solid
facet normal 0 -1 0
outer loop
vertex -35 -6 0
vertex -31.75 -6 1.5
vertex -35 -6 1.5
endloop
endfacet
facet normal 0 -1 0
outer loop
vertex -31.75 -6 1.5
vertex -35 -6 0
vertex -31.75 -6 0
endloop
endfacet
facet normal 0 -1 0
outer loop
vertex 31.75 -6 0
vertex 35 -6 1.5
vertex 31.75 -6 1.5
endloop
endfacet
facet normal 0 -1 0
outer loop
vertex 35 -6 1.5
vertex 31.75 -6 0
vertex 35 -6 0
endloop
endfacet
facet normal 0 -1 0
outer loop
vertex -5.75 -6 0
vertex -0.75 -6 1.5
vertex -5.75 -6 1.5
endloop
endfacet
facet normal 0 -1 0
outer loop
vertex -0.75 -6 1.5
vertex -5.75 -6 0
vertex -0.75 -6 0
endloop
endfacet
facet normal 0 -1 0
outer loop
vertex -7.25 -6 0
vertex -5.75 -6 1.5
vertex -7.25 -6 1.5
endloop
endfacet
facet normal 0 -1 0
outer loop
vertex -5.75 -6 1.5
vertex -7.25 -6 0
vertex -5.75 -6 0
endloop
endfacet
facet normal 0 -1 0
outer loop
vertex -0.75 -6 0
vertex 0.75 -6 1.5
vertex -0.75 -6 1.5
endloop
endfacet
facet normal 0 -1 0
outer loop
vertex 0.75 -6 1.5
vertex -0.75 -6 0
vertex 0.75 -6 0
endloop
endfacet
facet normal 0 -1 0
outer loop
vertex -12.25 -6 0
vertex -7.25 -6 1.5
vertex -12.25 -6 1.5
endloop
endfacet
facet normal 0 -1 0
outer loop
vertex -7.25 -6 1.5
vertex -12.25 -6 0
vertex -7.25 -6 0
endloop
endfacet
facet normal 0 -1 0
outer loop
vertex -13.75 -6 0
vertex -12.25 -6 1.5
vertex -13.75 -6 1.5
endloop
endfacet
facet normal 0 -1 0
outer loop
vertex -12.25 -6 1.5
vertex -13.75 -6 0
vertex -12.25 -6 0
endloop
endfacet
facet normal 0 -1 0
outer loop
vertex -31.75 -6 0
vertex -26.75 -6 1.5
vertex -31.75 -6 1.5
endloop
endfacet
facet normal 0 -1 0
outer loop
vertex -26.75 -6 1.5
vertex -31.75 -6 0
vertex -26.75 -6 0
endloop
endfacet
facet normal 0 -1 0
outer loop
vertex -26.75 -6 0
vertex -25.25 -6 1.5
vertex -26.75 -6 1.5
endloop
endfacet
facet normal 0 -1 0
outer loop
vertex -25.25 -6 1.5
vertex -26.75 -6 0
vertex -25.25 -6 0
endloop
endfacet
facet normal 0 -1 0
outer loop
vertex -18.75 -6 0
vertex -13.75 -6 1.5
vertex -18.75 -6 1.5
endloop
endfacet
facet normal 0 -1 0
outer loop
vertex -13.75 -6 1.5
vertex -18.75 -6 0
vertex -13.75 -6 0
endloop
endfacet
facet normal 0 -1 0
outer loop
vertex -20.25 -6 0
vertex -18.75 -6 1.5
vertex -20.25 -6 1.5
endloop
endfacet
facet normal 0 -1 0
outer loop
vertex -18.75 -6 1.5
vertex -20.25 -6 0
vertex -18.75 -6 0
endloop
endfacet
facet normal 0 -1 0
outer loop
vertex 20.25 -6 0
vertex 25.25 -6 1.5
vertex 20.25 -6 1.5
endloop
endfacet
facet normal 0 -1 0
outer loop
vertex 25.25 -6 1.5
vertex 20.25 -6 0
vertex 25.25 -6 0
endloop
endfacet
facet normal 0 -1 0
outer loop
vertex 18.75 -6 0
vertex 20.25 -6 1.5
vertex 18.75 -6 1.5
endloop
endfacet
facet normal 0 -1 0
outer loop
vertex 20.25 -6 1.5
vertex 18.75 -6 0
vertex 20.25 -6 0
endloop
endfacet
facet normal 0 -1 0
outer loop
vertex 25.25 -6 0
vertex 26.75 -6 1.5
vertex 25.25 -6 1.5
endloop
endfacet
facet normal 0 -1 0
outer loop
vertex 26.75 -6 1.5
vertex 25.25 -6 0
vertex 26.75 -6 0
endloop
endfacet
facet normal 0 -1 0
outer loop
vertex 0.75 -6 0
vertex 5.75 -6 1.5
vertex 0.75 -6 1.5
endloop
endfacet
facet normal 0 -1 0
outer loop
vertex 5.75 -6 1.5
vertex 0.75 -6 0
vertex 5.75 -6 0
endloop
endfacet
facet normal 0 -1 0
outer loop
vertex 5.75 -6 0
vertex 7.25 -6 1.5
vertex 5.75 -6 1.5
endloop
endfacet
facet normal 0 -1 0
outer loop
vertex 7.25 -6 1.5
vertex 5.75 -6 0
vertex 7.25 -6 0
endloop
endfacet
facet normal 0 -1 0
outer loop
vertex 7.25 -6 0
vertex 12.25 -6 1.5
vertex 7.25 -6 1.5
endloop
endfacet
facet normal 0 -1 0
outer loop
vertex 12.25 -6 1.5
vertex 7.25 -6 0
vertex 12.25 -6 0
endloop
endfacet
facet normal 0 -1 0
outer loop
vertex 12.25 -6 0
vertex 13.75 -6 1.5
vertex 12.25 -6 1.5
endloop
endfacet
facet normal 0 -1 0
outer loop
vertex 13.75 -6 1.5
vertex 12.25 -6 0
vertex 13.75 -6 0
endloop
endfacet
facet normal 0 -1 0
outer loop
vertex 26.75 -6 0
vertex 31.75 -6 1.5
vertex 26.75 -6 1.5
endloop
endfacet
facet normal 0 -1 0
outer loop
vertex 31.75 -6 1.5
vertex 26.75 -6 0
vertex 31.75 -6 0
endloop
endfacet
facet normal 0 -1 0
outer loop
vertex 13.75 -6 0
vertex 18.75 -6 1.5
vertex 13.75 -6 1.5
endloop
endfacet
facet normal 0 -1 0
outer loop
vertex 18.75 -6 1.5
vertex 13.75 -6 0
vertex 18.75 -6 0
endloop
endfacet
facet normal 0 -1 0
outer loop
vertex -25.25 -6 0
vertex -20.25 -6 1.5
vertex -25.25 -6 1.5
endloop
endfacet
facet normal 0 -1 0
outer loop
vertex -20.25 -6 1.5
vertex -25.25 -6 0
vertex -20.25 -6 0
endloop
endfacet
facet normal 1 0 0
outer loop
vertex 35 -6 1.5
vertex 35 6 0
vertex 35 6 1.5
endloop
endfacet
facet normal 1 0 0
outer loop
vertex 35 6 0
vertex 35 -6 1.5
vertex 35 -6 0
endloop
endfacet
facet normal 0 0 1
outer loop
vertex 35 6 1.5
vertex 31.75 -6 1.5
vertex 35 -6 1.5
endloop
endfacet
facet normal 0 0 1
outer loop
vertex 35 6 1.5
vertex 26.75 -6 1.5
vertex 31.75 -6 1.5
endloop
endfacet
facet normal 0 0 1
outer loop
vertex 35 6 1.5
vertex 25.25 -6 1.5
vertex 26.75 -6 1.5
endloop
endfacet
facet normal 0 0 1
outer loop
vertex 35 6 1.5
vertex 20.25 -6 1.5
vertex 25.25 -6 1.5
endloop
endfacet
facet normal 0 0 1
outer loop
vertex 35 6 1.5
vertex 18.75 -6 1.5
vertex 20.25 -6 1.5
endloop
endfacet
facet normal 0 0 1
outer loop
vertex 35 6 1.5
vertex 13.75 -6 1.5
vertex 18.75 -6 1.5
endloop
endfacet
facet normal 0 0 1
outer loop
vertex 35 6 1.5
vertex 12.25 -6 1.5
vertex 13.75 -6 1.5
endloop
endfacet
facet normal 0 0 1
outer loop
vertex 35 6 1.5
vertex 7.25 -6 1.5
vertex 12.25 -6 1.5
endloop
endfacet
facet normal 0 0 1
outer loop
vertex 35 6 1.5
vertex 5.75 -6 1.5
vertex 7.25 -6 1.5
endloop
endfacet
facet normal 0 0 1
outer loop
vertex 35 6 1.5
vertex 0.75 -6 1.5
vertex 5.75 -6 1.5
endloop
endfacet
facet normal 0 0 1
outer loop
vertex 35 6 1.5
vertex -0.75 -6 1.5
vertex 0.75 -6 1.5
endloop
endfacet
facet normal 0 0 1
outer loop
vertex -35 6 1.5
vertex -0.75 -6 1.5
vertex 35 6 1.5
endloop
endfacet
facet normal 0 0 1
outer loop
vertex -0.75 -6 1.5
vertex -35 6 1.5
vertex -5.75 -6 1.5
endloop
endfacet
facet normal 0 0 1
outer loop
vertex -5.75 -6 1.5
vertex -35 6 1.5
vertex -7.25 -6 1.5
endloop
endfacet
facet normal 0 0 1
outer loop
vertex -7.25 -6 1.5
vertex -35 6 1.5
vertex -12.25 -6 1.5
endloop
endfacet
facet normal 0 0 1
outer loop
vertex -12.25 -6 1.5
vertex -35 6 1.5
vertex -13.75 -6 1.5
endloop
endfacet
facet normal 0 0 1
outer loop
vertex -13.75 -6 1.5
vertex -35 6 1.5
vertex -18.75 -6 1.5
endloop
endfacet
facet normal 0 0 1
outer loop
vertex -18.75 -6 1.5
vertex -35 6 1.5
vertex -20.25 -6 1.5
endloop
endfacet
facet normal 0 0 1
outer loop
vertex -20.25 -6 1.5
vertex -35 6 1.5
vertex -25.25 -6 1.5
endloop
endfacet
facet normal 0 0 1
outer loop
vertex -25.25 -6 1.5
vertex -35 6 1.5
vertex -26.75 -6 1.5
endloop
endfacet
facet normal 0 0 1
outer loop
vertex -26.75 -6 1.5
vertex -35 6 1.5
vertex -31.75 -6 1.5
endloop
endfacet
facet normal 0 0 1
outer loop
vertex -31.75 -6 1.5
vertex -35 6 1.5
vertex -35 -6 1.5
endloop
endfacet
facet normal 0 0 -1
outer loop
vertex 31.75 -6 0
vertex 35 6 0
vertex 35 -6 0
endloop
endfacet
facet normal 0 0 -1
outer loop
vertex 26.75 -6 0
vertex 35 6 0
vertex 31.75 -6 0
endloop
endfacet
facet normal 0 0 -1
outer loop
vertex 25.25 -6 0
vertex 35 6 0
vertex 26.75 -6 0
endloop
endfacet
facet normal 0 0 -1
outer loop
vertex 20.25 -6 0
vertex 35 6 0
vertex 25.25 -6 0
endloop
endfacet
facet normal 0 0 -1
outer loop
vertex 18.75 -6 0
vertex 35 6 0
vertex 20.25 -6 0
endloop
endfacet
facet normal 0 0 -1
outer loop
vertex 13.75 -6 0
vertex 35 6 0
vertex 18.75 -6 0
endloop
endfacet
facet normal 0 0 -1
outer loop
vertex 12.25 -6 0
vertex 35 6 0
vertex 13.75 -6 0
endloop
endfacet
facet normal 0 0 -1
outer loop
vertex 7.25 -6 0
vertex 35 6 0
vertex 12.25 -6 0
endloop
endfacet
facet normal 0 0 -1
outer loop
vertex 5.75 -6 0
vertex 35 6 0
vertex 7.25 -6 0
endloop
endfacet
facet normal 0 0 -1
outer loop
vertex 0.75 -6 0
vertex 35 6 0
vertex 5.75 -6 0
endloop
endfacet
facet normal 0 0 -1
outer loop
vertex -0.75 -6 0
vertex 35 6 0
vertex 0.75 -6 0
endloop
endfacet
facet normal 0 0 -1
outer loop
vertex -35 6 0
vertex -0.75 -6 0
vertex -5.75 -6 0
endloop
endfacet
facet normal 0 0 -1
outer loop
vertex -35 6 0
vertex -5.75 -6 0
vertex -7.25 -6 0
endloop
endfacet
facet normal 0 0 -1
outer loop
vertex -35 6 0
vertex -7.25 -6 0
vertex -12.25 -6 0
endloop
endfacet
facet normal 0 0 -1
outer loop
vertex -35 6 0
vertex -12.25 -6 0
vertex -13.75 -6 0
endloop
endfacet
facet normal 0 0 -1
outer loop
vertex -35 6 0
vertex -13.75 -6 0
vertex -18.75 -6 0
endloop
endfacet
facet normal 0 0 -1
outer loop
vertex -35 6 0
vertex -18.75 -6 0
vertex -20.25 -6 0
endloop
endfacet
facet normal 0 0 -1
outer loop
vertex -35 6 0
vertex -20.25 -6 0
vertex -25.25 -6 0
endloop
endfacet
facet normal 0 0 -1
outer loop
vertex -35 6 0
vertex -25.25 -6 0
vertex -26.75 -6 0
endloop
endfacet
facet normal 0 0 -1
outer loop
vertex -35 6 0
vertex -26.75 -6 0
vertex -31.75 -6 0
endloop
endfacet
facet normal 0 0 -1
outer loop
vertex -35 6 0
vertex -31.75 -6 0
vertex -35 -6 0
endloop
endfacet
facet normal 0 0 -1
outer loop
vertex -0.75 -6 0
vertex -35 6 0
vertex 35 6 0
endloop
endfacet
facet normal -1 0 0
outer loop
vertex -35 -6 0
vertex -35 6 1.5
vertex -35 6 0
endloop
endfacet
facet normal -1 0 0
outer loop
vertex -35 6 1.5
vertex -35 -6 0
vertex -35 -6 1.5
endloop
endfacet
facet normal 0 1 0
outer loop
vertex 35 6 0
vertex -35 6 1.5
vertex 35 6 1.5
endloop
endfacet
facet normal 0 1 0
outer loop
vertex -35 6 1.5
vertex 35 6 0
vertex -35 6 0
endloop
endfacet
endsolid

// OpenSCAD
// 10-well comb for agarose gel casting, printed lying flat
// Units: mm

$fn = 64;

// Spine (back bar)
spine_len   = 70;   // length along X
spine_wid   = 12;   // width along Y

// Teeth
tooth_count = 10;   // number of teeth
tooth_w     = 5.0;  // tooth width along X
tooth_l     = 12;   // tooth length along Y (hanging from spine)

// Plate
plate_t     = 1.5;  // plate thickness along Z

// Gaps
gap         = 1.5;  // spacing between neighbouring teeth along X

// Derived
pitch       = tooth_w + gap;  // centre-to-centre spacing along X
overhang    = tooth_l + 0.5;  // tooth length + cut clearance

difference() {
    // Base plate
    translate([-spine_len/2, -spine_wid/2, 0])
        cube([spine_len, spine_wid, plate_t]);

    // Teeth, centred on spine in X
    for (i = [0 : tooth_count - 1]) {
        x = (i - (tooth_count - 1)/2) * pitch;
        translate([x - tooth_w/2, -spine_wid/2 - overhang, 0])
            cube([tooth_w, tooth_l + 0.5, plate_t]);
    }
}
